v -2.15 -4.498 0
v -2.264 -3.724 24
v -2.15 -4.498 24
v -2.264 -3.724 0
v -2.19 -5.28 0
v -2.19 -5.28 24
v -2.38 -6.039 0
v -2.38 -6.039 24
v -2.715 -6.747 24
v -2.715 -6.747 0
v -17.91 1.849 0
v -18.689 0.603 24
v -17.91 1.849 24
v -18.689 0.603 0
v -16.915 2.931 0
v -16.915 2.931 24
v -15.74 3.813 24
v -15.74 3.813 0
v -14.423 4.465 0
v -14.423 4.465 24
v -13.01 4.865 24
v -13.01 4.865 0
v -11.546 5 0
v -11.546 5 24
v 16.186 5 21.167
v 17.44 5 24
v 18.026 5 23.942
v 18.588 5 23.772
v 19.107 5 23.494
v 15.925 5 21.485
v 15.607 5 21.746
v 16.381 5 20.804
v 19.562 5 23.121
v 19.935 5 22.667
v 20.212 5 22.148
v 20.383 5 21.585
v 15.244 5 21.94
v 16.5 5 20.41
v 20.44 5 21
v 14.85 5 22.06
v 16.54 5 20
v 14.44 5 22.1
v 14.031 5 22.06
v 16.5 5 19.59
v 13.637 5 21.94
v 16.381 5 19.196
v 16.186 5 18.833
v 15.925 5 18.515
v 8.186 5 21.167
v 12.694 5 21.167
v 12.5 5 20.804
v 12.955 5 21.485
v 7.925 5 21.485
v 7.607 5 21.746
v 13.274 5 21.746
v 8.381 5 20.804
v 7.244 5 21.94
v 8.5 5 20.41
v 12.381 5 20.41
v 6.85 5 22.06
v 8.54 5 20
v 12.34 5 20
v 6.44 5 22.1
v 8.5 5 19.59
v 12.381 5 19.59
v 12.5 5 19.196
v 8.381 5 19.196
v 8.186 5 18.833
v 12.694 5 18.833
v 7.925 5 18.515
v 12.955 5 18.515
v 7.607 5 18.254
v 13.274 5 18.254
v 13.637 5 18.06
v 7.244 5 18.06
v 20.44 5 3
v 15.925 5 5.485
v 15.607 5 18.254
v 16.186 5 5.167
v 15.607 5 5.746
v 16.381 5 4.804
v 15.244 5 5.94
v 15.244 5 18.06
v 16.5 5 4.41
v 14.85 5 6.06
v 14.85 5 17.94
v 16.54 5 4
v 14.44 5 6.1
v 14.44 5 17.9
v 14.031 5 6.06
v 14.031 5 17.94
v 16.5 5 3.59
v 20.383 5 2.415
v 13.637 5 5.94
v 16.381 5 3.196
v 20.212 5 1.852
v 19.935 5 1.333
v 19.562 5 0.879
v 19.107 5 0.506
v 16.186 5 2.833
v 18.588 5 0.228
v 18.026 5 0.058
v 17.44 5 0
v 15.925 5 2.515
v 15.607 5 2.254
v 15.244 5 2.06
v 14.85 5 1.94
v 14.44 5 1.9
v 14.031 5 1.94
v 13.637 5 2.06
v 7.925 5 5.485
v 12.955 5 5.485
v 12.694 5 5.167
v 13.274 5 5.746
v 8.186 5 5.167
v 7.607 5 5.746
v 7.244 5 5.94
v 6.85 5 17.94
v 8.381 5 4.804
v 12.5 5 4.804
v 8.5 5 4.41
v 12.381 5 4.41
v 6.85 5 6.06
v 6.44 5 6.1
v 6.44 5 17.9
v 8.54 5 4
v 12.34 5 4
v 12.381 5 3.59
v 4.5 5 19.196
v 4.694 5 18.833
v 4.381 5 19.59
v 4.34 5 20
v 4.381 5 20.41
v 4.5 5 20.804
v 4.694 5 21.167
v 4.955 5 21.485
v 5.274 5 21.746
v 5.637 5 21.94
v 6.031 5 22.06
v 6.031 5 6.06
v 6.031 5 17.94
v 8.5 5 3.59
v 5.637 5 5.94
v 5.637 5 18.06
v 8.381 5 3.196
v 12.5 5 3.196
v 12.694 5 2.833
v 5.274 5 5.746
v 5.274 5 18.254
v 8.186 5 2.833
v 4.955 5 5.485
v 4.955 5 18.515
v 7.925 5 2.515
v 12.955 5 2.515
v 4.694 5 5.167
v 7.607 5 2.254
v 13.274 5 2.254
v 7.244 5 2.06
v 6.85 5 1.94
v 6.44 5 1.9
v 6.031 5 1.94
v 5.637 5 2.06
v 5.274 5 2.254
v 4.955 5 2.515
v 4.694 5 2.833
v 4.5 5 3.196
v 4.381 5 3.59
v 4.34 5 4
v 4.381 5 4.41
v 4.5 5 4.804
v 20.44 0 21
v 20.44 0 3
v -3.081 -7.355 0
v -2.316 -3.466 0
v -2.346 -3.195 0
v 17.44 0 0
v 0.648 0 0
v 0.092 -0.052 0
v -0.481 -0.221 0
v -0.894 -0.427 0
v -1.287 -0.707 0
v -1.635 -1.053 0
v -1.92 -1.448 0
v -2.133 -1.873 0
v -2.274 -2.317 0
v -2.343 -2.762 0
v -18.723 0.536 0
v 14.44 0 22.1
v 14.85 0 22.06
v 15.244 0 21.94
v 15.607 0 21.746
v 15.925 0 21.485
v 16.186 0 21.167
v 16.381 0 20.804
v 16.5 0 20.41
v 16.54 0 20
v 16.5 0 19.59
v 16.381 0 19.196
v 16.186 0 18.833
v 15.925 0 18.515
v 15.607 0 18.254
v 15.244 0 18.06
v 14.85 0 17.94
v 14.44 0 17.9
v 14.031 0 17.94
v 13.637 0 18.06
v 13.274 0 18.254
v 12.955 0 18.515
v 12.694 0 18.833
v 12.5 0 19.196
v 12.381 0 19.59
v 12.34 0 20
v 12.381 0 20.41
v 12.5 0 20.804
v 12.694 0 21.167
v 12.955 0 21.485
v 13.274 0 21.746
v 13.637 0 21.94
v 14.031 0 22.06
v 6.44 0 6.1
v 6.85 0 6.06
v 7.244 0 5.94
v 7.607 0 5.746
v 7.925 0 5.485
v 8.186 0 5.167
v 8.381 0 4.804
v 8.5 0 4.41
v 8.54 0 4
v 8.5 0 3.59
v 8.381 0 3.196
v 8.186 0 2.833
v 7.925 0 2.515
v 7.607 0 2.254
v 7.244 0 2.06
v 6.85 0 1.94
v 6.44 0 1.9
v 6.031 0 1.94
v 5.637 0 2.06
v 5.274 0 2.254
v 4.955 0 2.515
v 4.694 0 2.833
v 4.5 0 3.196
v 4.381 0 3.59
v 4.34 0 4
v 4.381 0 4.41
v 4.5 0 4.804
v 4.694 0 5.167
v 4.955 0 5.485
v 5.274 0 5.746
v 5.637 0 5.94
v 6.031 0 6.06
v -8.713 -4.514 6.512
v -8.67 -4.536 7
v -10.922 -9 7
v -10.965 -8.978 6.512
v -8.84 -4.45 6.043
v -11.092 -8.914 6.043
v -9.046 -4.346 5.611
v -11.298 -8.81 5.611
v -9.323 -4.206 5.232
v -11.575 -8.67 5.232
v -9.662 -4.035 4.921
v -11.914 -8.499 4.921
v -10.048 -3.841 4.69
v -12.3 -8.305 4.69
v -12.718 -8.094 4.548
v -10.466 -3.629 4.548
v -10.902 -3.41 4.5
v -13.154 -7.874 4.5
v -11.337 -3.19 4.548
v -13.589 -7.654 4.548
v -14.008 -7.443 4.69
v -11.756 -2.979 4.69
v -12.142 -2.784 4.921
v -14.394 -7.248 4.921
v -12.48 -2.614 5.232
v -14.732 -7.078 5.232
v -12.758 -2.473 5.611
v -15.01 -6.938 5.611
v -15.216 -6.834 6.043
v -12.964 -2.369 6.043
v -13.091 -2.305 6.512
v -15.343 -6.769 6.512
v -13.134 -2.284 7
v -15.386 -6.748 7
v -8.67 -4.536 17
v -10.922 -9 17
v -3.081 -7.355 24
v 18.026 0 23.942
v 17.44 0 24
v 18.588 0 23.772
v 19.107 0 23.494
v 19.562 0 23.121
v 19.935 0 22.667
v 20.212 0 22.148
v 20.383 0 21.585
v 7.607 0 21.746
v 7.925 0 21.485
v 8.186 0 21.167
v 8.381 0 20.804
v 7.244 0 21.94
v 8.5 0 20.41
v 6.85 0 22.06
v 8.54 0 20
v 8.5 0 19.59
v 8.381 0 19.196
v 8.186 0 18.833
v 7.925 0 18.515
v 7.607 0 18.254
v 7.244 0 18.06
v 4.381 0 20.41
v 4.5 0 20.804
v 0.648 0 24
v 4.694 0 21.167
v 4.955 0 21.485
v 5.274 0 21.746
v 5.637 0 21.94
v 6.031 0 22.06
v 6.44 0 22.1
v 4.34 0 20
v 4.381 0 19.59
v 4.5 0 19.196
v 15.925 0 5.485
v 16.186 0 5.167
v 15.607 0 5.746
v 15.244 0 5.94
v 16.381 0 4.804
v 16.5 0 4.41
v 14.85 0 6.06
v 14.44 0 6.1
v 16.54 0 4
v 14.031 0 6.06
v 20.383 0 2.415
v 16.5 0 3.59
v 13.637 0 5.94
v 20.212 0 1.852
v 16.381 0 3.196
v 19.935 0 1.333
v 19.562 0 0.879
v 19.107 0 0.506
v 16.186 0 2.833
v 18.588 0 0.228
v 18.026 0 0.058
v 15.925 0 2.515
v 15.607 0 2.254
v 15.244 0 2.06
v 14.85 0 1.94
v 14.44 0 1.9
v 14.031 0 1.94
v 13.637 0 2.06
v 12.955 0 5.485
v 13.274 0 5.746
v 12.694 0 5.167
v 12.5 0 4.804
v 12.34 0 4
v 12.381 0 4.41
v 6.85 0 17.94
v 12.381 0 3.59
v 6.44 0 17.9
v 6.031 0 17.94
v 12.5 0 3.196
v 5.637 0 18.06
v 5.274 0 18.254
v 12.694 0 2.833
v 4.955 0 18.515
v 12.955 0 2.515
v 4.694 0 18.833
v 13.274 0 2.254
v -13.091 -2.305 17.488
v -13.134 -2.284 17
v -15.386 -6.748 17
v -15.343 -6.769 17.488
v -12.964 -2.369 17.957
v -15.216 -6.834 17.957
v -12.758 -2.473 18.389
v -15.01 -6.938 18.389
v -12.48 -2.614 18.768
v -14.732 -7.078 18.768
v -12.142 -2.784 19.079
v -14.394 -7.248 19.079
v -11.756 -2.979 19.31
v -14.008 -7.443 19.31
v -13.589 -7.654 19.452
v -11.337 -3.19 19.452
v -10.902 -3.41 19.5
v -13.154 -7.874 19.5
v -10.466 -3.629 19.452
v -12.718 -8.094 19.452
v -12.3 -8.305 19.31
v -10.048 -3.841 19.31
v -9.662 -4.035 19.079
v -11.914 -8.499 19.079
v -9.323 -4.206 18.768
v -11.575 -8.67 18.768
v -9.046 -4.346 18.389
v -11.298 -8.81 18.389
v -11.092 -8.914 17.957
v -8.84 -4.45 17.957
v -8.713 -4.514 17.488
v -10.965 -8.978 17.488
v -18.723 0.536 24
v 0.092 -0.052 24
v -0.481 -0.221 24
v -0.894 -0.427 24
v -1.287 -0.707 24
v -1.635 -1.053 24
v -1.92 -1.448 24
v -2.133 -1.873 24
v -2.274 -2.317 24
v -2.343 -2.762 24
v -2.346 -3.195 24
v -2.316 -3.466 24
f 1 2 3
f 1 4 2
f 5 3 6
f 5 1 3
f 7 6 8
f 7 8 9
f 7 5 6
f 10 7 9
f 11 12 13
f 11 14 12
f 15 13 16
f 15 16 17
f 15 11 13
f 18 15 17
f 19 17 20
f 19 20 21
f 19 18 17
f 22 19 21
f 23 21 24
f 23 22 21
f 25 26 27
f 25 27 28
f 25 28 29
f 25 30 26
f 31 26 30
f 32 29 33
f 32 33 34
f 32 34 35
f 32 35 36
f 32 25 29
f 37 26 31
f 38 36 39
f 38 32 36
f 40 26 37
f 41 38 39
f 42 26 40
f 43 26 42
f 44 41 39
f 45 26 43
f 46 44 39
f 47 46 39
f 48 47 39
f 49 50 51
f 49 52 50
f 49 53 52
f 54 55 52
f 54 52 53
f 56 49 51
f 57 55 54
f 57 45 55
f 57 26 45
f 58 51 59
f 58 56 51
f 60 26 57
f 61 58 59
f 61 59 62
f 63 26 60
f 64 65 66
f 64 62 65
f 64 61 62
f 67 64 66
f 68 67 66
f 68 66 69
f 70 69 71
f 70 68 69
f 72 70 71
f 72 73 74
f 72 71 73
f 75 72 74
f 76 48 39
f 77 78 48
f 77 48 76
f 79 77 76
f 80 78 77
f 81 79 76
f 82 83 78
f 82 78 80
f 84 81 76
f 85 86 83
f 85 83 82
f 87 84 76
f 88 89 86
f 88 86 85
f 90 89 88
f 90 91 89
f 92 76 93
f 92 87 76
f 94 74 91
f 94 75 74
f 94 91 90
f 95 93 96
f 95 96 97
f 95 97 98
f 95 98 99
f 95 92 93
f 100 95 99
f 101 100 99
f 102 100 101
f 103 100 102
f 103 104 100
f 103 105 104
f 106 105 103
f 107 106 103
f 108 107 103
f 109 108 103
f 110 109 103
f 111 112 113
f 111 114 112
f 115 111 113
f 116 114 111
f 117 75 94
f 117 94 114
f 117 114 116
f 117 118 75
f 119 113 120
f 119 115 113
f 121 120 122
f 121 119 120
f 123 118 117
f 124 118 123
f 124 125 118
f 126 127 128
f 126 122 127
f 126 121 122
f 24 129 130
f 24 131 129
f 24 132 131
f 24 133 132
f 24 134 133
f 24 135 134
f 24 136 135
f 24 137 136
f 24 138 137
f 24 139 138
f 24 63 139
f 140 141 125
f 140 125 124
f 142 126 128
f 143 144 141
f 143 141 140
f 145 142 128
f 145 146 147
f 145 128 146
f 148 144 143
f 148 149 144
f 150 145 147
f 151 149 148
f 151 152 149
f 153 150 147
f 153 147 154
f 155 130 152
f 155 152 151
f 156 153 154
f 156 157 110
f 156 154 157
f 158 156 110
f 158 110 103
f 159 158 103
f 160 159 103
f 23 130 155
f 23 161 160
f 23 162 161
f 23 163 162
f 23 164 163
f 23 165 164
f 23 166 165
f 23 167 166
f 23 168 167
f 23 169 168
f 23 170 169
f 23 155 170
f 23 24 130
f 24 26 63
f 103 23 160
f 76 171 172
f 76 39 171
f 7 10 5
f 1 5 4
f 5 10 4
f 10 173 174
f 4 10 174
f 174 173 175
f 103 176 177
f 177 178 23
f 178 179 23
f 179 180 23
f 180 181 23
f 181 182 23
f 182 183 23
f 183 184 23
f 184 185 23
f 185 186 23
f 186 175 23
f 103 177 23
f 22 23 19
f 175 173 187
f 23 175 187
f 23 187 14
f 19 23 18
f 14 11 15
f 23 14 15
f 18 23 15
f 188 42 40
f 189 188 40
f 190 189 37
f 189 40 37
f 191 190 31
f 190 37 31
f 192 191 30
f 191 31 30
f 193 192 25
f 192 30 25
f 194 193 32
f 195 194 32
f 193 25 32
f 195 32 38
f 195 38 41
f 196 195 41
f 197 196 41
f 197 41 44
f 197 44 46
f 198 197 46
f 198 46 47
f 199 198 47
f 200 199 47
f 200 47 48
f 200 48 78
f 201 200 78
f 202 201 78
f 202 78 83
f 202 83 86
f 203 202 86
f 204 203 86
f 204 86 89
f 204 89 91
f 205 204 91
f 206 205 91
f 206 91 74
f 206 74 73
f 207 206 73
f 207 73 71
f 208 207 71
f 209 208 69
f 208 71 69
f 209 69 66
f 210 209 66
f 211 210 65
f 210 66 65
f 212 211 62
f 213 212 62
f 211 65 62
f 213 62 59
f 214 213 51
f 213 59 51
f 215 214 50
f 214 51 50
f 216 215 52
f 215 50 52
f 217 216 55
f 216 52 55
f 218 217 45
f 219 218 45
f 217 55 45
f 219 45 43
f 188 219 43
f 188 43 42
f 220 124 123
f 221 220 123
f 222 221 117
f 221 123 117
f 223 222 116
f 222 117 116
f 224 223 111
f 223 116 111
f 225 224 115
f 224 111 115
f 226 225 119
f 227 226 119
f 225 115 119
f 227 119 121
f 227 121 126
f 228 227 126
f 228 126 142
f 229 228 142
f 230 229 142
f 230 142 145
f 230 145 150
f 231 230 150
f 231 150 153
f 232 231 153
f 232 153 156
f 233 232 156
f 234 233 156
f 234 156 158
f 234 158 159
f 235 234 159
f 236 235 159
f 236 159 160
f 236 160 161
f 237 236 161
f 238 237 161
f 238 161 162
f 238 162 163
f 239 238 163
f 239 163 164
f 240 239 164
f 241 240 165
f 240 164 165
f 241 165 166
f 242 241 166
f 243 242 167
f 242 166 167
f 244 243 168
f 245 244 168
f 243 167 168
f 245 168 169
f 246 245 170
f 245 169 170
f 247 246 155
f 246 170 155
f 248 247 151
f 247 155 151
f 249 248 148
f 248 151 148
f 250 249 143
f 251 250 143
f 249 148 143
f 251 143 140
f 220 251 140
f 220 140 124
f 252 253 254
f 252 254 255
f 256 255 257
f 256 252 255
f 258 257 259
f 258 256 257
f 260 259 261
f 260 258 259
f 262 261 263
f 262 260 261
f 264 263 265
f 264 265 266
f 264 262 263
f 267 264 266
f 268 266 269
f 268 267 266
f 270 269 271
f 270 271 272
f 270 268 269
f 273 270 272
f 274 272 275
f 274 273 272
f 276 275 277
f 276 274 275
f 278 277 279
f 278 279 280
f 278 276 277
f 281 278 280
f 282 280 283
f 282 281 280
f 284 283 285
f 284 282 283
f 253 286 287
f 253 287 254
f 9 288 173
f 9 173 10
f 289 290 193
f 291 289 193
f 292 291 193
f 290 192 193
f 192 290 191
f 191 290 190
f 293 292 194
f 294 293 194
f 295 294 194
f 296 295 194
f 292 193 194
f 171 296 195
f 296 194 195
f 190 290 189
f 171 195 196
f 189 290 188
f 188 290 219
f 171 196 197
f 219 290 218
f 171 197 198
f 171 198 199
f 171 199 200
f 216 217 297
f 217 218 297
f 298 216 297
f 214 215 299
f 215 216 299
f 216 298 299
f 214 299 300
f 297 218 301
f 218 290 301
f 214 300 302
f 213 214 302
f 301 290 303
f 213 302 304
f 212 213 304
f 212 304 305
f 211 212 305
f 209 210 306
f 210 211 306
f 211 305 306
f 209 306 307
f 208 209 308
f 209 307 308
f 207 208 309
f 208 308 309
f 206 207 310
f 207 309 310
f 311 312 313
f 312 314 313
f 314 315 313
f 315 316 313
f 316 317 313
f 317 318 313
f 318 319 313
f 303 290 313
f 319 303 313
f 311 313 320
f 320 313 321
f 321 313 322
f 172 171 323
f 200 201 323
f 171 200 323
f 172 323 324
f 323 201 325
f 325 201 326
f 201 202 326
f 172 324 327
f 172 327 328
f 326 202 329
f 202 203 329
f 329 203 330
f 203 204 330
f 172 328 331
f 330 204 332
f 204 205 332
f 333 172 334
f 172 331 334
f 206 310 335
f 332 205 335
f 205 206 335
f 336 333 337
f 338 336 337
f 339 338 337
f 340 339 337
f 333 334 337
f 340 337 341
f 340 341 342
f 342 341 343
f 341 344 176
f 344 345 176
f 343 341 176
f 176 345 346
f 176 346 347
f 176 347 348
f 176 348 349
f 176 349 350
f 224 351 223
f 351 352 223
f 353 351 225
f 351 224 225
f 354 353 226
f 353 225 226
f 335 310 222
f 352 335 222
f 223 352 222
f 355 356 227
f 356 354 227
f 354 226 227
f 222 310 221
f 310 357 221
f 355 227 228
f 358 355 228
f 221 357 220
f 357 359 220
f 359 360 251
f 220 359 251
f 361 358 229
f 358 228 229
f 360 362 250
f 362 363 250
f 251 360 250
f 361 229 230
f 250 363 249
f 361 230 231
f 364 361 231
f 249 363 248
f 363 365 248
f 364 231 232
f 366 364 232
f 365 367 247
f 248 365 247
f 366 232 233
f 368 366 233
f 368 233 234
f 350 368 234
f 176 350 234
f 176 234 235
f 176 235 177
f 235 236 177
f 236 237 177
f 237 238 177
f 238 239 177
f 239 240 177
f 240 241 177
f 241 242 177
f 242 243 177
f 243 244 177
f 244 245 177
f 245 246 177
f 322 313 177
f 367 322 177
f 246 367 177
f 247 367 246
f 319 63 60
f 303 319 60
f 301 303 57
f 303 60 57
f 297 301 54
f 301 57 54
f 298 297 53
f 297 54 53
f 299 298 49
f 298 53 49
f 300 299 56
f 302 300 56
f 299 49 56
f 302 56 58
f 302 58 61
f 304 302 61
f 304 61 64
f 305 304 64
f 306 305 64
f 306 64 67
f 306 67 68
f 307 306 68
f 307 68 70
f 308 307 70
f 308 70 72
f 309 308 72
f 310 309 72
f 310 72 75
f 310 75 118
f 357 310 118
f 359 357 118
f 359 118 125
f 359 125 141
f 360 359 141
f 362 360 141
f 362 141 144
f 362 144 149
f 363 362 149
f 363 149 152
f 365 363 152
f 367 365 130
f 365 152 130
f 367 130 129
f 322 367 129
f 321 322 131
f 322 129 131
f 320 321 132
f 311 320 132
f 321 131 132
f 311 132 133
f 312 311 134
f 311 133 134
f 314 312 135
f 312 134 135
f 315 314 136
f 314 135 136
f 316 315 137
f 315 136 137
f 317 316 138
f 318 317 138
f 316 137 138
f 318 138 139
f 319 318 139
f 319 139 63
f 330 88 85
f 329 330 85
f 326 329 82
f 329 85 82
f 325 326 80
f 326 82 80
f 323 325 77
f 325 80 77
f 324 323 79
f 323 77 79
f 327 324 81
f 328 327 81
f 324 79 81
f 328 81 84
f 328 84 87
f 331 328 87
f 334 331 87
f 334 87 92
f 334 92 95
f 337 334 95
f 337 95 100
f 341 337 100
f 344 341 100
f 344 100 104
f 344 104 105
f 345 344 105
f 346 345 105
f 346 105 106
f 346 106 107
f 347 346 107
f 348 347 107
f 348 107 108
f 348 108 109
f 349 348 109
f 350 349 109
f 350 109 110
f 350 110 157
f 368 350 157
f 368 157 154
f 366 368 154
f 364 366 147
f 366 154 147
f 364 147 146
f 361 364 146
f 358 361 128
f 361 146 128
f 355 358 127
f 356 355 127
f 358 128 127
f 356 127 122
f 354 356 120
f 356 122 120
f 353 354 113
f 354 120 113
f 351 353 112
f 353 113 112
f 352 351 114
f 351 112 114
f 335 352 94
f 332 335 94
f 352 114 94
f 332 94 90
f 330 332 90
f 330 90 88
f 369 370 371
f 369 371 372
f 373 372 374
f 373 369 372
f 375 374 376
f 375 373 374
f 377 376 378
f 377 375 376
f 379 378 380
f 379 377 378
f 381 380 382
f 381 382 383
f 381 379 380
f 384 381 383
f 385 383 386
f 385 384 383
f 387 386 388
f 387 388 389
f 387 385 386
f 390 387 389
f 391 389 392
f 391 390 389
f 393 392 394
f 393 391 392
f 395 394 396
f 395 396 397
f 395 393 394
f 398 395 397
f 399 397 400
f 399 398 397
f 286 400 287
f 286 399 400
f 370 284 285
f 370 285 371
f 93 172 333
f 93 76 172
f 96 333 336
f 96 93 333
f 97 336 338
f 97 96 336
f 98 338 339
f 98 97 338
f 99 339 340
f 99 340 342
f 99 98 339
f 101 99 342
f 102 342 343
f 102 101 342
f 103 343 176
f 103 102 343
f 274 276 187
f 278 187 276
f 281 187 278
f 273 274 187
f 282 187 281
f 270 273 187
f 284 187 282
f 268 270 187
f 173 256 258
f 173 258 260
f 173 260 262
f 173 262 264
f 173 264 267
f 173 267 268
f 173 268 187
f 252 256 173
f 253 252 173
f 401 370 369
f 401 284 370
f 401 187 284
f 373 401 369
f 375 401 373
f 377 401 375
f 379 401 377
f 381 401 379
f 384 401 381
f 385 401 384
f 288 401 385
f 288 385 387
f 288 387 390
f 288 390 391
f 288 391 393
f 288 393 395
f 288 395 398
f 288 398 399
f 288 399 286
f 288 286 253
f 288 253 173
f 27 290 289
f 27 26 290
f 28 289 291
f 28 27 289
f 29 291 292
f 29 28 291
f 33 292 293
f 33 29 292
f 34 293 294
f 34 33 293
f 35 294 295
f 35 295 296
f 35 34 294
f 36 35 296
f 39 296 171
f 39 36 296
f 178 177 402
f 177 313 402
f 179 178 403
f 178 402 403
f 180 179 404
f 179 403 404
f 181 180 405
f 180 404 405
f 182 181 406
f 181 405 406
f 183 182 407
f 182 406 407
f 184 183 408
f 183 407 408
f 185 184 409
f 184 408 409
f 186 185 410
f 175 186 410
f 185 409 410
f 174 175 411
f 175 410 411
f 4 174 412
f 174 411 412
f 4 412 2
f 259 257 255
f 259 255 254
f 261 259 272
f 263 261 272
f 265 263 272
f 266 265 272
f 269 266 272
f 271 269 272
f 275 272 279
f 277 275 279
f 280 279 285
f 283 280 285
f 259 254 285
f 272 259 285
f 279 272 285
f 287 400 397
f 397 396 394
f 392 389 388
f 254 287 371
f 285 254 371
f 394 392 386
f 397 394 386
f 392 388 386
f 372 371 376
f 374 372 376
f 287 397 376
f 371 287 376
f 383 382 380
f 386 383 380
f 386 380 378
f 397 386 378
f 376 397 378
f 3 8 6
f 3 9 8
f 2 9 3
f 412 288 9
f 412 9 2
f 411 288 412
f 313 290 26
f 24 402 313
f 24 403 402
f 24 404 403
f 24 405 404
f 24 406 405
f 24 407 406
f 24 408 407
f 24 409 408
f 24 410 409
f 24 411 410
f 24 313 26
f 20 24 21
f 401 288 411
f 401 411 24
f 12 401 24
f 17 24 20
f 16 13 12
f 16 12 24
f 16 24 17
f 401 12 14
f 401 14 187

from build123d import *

# Parameters (mm, degrees)
ESQUISSE1_W             = 17
ESQUISSE1_H             = 5
BOSS_EXTRU_1_DEPTH      = 24
BOSS_EXTRU_2_DEPTH      = 24
CONG_1_R                = 4
CONG_2_R                = 8
CONG_3_R                = 3
ESQUISSE3_W             = 24
ESQUISSE3_H             = 5
BOSS_EXTRU_3_DEPTH      = 10
ESQUISSE4_R             = 2.1
ENL_V_MAT_EXTRU_1_DEPTH = 10
CONG_4_R                = 3
BOSS_EXTRU_4_DEPTH      = 5


with BuildPart() as part:
    # Esquisse1 → Boss.-Extru.1 (new body)
    with BuildSketch(Plane.XY):
        with Locations((1.940369129, 2.5)):
            Rectangle(ESQUISSE1_W, ESQUISSE1_H)
    extrude(amount=BOSS_EXTRU_1_DEPTH)

    # Esquisse2 → Boss.-Extru.2 (add)
    with BuildSketch(Plane.XY.offset(24)):
        Polygon((-18.723069156, 0.535871193), (-3.080508445, -7.355303518), (-0.501566554, -3.056100904), (-16.471058056, 5), align=None)
        Polygon((-6.559630871, 0), (-6.559630871, 5), (-16.471058056, 5), align=None)
    extrude(amount=-BOSS_EXTRU_2_DEPTH)

    # Congé1
    cong_1_edges = [part.edges().sort_by_distance(p)[0] for p in [
        (-0.501566554, -3.056100904, 12),
    ]]
    fillet(cong_1_edges, radius=CONG_1_R)

    # Congé2
    cong_2_edges = [part.edges().sort_by_distance(p)[0] for p in [
        (-16.471058056, 5, 12),
    ]]
    fillet(cong_2_edges, radius=CONG_2_R)

    # Congé3
    cong_3_edges = [part.edges().sort_by_distance(p)[0] for p in [
        (-6.559630871, 0, 12),
    ]]
    fillet(cong_3_edges, radius=CONG_3_R)

    # Esquisse3 → Boss.-Extru.3 (add)
    with BuildSketch(Plane(origin=(10.440369129, 0, 0), x_dir=(0, 0, -1), z_dir=(1, 0, 0))):
        with Locations((-12, 2.5)):
            Rectangle(ESQUISSE3_W, ESQUISSE3_H)
    extrude(amount=BOSS_EXTRU_3_DEPTH)

    # Esquisse4 → Enlèv. mat.-Extru.1 (cut)
    with BuildSketch(Plane(origin=(0, 5, 0), x_dir=(1, 0, 0), z_dir=(0, 1, 0))):
        with Locations(Location((6.440369129, -20, 0), (0, 0, 270))):
            Circle(ESQUISSE4_R)
        with Locations(Location((14.440369129, -20, 0), (0, 0, 270))):
            Circle(ESQUISSE4_R)
        with Locations(Location((14.440369129, -4, 0), (0, 0, 270))):
            Circle(ESQUISSE4_R)
        with Locations(Location((6.440369129, -4, 0), (0, 0, 270))):
            Circle(ESQUISSE4_R)
    extrude(amount=-ENL_V_MAT_EXTRU_1_DEPTH, mode=Mode.SUBTRACT)

    # Congé4
    cong_4_edges = [part.edges().sort_by_distance(p)[0] for p in [
        (20.440369129, 2.5, 0),
        (20.440369129, 2.5, 24),
    ]]
    fillet(cong_4_edges, radius=CONG_4_R)

    # Esquisse5 → Boss.-Extru.4 (add)
    with BuildSketch(Plane(origin=(-3.582711985, -7.101957793, 0), x_dir=(0.892825761431464, -0.45040221993716517, 0), z_dir=(-0.45040221993716517, -0.892825761431464, 0))):
        with BuildLine():
            Line((-5.697654158, 17), (-5.697654158, 7))
            ThreePointArc((-5.697654158, 7), (-8.197654158, 4.5), (-10.697654158, 7))
            Line((-10.697654158, 7), (-10.697654158, 17))
            ThreePointArc((-10.697654158, 17), (-8.197654158, 19.5), (-5.697654158, 17))
        make_face()
    extrude(amount=BOSS_EXTRU_4_DEPTH)


solid = part.part
